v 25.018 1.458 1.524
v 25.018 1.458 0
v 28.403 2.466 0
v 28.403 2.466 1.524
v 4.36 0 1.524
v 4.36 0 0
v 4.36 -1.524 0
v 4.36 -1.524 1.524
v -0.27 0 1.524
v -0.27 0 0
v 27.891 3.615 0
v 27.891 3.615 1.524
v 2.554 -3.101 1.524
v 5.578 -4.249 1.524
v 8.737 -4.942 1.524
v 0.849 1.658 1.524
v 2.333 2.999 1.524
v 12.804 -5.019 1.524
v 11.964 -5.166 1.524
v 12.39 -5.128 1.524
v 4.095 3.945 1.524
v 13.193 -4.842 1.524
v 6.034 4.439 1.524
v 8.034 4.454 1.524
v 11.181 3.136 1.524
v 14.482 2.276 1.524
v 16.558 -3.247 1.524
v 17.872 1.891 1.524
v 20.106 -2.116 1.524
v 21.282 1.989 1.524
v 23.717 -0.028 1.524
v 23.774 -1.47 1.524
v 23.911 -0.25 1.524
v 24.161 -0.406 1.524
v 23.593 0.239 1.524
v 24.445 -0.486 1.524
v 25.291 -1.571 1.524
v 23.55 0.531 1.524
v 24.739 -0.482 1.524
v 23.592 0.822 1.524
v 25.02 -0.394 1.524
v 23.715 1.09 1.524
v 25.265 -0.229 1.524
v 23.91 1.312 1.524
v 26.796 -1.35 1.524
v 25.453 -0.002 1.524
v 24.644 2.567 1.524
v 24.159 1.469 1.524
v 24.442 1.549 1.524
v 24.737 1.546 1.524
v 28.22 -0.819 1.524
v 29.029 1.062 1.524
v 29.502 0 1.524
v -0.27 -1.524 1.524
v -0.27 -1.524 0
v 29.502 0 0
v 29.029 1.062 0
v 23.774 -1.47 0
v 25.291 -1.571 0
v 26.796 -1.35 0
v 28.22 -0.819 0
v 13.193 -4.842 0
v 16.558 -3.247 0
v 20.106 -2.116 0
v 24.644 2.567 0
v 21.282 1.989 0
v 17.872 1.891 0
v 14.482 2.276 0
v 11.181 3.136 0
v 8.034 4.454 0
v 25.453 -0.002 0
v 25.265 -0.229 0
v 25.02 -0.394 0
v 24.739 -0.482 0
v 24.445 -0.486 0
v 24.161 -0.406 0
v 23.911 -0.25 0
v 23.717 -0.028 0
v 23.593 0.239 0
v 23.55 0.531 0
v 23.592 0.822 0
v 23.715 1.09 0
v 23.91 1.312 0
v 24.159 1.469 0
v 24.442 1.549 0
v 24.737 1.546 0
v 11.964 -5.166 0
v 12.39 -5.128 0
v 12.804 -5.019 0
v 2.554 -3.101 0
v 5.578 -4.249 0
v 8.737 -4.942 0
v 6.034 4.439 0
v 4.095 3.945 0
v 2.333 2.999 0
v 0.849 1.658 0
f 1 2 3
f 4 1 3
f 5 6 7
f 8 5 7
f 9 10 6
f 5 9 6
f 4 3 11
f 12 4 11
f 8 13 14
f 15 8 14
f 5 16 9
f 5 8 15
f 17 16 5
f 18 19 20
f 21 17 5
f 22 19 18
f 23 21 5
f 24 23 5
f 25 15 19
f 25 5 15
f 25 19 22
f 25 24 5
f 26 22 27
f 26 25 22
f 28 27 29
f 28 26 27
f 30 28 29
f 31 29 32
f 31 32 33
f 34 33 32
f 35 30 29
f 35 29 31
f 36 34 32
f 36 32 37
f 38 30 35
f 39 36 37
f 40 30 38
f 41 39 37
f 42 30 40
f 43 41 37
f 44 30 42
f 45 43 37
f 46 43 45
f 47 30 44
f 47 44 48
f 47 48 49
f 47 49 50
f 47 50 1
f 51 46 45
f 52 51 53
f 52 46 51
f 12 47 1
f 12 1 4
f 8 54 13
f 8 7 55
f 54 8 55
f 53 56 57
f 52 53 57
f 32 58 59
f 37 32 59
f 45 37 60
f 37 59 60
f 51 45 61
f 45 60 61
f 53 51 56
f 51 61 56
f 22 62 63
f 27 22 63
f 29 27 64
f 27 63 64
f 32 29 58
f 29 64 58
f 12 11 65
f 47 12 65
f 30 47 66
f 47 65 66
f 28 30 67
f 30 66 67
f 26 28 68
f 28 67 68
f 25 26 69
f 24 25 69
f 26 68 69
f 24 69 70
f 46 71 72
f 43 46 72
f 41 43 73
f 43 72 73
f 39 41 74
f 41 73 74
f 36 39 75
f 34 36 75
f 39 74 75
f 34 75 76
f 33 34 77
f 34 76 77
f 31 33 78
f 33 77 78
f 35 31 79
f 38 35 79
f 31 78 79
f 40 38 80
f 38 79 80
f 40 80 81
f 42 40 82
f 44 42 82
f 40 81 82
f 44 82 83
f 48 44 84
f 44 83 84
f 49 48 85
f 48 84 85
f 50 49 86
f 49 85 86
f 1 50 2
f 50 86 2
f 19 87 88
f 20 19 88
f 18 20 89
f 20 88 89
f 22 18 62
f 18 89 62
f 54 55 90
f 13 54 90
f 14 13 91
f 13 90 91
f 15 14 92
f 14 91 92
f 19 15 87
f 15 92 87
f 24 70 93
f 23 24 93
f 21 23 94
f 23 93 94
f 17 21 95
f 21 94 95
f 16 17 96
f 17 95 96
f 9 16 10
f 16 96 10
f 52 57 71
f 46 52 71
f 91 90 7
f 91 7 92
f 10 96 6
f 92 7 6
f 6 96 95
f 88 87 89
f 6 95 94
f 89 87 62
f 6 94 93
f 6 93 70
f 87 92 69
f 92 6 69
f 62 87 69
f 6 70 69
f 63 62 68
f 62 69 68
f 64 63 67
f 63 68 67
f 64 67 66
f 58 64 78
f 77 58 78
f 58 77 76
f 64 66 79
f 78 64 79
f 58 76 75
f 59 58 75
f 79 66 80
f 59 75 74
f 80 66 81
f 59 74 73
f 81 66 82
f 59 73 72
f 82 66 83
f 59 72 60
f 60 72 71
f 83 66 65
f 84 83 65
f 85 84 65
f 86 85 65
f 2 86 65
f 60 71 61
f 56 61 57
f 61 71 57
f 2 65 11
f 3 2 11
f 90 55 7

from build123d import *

# Parameters (mm, degrees)
BOSS_EXTRUDE1_DEPTH = 1.524


with BuildPart() as part:
    # Sketch1 → Boss-Extrude1 (new body)
    with BuildSketch(Plane.XY):
        with BuildLine():
            Line((4.36034561, 0), (4.36034561, -1.524))
            Line((4.36034561, -1.524), (-0.270041396, -1.524))
            ThreePointArc((-0.270041396, -1.524), (5.57790397, -4.249042789), (11.964164328, -5.165558929))
            ThreePointArc((11.964164328, -5.165558929), (12.599243088, -5.082111381), (13.193252116, -4.842441192))
            ThreePointArc((13.193252116, -4.842441192), (18.3130715, -2.621767508), (23.773581772, -1.469912607))
            ThreePointArc((23.773581772, -1.469912607), (26.795642109, -1.350433231), (29.50183022, 0))
            Line((29.50183022, 0), (29.028606423, 1.061962035))
            Line((29.028606423, 1.061962035), (25.453006053, -0.002386196))
            ThreePointArc((25.453006053, -0.002386196), (23.593059825, 0.239006946), (25.018211481, 1.458274504))
            Line((25.018211481, 1.458274504), (28.403024501, 2.465831103))
            Line((28.403024501, 2.465831103), (27.891133112, 3.614567125))
            ThreePointArc((27.891133112, 3.614567125), (17.871956928, 1.891446971), (8.033839359, 4.453570535))
            ThreePointArc((8.033839359, 4.453570535), (3.185317895, 3.52559175), (-0.270041396, 0))
            Line((-0.270041396, 0), (4.36034561, 0))
        make_face()
    extrude(amount=BOSS_EXTRUDE1_DEPTH)


solid = part.part
